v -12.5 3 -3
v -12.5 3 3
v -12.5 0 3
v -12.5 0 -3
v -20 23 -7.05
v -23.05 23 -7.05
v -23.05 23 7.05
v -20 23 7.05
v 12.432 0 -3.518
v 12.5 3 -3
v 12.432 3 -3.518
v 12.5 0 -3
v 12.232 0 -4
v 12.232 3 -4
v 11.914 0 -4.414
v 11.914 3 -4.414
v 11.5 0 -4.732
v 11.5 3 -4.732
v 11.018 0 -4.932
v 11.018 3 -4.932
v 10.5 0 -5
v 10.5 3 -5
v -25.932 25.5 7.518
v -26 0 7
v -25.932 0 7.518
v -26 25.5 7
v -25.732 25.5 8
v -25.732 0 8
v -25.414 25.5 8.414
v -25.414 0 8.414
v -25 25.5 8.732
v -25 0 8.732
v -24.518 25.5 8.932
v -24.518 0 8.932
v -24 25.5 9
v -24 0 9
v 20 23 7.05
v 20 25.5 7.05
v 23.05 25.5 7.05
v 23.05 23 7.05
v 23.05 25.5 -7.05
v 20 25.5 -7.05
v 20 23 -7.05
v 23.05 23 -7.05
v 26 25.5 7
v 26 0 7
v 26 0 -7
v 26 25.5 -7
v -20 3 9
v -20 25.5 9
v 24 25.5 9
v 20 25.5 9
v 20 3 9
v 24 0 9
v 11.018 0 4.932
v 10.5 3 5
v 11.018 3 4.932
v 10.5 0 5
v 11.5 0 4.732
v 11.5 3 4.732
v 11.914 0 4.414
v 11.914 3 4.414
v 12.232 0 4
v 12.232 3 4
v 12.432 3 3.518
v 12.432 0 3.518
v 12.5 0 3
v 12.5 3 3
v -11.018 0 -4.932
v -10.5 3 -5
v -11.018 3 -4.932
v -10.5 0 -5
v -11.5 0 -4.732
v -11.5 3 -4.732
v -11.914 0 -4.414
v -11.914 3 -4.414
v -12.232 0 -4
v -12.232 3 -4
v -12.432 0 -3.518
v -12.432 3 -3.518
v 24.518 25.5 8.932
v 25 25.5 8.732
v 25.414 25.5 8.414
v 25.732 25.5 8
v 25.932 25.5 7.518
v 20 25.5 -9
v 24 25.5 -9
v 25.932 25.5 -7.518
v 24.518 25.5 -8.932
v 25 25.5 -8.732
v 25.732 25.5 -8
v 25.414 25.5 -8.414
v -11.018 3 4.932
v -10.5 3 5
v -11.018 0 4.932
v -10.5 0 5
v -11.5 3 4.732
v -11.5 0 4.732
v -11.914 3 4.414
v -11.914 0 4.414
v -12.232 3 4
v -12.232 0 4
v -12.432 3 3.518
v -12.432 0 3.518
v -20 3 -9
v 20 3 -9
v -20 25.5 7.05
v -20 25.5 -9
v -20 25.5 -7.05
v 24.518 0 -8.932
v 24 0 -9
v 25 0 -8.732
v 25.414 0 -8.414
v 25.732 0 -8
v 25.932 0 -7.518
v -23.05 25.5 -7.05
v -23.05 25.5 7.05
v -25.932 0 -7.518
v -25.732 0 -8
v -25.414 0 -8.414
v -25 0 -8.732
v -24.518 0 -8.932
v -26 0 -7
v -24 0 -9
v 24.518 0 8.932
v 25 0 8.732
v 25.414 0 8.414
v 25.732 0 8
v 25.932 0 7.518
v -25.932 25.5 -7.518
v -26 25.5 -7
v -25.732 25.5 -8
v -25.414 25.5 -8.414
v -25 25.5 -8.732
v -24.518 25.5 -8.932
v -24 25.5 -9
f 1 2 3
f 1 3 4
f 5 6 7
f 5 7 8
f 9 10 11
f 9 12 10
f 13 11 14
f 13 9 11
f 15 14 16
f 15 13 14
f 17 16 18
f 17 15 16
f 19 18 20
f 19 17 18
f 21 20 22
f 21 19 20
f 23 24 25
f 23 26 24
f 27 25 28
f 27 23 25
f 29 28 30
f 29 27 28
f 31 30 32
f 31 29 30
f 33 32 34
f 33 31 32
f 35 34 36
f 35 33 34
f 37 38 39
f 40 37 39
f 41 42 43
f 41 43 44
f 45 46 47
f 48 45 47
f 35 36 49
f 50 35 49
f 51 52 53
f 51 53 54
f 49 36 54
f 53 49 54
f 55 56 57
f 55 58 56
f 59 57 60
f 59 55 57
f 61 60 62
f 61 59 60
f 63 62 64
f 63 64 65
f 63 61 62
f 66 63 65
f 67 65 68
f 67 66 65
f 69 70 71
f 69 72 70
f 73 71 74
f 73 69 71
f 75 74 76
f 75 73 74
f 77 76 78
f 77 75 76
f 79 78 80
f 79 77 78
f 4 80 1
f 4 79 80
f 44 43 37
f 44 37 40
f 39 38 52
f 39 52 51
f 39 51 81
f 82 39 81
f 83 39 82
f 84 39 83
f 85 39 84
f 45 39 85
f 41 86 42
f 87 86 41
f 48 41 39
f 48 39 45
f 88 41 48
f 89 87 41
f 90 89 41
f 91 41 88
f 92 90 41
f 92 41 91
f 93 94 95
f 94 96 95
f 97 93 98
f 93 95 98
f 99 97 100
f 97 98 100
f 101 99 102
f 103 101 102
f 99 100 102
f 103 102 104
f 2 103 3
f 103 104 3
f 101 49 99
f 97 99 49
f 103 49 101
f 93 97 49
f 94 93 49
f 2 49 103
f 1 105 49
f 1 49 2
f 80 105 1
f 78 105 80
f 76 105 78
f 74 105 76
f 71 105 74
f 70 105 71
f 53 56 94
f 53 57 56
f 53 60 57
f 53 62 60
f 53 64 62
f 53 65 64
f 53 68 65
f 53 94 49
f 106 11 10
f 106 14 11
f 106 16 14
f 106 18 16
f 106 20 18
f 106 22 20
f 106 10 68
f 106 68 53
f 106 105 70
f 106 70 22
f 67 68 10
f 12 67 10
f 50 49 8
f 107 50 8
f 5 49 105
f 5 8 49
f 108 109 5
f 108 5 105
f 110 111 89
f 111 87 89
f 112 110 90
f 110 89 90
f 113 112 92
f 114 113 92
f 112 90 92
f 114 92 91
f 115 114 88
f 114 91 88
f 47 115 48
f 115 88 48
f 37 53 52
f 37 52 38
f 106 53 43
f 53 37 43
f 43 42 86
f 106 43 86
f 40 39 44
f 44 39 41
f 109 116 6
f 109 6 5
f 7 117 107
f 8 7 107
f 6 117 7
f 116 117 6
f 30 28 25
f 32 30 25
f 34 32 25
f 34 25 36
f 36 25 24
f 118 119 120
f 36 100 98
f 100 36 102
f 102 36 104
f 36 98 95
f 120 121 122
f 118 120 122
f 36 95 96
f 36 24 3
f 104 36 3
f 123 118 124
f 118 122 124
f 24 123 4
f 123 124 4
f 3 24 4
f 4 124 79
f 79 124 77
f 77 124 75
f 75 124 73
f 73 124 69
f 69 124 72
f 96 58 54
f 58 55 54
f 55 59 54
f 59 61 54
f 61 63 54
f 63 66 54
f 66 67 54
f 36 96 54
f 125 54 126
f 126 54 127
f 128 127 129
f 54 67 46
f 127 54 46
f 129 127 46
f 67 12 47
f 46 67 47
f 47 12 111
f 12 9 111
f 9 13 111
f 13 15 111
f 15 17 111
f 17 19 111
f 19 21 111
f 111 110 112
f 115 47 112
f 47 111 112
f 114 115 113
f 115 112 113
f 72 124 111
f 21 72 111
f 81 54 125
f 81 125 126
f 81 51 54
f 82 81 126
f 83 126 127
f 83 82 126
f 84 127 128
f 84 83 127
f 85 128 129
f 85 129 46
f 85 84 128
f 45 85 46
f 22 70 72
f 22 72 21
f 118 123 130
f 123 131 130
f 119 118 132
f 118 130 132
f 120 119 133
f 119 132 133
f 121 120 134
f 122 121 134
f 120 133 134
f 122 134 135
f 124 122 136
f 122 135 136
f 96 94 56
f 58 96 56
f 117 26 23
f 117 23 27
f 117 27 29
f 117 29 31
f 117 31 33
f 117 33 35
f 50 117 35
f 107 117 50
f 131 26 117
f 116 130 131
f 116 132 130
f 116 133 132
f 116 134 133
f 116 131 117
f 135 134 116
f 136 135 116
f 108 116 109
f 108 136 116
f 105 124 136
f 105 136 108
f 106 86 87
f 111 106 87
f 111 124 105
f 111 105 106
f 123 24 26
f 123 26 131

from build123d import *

# Parameters (mm, degrees)
SKETCH1_W           = 52
SKETCH1_H           = 18
BOSS_EXTRUDE1_DEPTH = 25.5
SKETCH2_W           = 46.1
SKETCH2_H           = 14.1
CUT_EXTRUDE1_DEPTH  = 2.5
SKETCH4_W           = 40
SKETCH4_H           = 18
CUT_EXTRUDE2_DEPTH  = 22.5
SKETCH5_W           = 25
SKETCH5_H           = 10
CUT_EXTRUDE3_DEPTH  = 4
FILLET1_R           = 2
FILLET2_R           = 2


with BuildPart() as part:
    # Sketch1 → Boss-Extrude1 (new body)
    with BuildSketch(Plane(origin=(0, 0, 0), x_dir=(1, 0, 0), z_dir=(0, 1, 0))):
        Rectangle(SKETCH1_W, SKETCH1_H)
    extrude(amount=BOSS_EXTRUDE1_DEPTH)

    # Sketch2 → Cut-Extrude1 (cut)
    with BuildSketch(Plane(origin=(0, 25.5, 0), x_dir=(1, 0, 0), z_dir=(0, 1, 0))):
        Rectangle(SKETCH2_W, SKETCH2_H)
    extrude(amount=-CUT_EXTRUDE1_DEPTH, mode=Mode.SUBTRACT)

    # Sketch4 → Cut-Extrude2 (cut)
    with BuildSketch(Plane(origin=(0, 25.5, 0), x_dir=(1, 0, 0), z_dir=(0, 1, 0))):
        Rectangle(SKETCH4_W, SKETCH4_H)
    extrude(amount=-CUT_EXTRUDE2_DEPTH, mode=Mode.SUBTRACT)

    # Sketch5 → Cut-Extrude3 (cut, through all)
    with BuildSketch(Plane(origin=(0, 3, 0), x_dir=(1, 0, 0), z_dir=(0, 1, 0))):
        Rectangle(SKETCH5_W, SKETCH5_H)
    extrude(amount=-CUT_EXTRUDE3_DEPTH, mode=Mode.SUBTRACT)

    # Fillet1
    fillet1_edges = [part.edges().sort_by_distance(p)[0] for p in [
        (-26, 12.75, -9),
        (26, 12.75, -9),
        (26, 12.75, 9),
        (-26, 12.75, 9),
    ]]
    fillet(fillet1_edges, radius=FILLET1_R)

    # Fillet2
    fillet2_edges = [part.edges().sort_by_distance(p)[0] for p in [
        (-12.5, 1.5, 5),
        (-12.5, 1.5, -5),
        (12.5, 1.5, -5),
        (12.5, 1.5, 5),
    ]]
    fillet(fillet2_edges, radius=FILLET2_R)


solid = part.part
